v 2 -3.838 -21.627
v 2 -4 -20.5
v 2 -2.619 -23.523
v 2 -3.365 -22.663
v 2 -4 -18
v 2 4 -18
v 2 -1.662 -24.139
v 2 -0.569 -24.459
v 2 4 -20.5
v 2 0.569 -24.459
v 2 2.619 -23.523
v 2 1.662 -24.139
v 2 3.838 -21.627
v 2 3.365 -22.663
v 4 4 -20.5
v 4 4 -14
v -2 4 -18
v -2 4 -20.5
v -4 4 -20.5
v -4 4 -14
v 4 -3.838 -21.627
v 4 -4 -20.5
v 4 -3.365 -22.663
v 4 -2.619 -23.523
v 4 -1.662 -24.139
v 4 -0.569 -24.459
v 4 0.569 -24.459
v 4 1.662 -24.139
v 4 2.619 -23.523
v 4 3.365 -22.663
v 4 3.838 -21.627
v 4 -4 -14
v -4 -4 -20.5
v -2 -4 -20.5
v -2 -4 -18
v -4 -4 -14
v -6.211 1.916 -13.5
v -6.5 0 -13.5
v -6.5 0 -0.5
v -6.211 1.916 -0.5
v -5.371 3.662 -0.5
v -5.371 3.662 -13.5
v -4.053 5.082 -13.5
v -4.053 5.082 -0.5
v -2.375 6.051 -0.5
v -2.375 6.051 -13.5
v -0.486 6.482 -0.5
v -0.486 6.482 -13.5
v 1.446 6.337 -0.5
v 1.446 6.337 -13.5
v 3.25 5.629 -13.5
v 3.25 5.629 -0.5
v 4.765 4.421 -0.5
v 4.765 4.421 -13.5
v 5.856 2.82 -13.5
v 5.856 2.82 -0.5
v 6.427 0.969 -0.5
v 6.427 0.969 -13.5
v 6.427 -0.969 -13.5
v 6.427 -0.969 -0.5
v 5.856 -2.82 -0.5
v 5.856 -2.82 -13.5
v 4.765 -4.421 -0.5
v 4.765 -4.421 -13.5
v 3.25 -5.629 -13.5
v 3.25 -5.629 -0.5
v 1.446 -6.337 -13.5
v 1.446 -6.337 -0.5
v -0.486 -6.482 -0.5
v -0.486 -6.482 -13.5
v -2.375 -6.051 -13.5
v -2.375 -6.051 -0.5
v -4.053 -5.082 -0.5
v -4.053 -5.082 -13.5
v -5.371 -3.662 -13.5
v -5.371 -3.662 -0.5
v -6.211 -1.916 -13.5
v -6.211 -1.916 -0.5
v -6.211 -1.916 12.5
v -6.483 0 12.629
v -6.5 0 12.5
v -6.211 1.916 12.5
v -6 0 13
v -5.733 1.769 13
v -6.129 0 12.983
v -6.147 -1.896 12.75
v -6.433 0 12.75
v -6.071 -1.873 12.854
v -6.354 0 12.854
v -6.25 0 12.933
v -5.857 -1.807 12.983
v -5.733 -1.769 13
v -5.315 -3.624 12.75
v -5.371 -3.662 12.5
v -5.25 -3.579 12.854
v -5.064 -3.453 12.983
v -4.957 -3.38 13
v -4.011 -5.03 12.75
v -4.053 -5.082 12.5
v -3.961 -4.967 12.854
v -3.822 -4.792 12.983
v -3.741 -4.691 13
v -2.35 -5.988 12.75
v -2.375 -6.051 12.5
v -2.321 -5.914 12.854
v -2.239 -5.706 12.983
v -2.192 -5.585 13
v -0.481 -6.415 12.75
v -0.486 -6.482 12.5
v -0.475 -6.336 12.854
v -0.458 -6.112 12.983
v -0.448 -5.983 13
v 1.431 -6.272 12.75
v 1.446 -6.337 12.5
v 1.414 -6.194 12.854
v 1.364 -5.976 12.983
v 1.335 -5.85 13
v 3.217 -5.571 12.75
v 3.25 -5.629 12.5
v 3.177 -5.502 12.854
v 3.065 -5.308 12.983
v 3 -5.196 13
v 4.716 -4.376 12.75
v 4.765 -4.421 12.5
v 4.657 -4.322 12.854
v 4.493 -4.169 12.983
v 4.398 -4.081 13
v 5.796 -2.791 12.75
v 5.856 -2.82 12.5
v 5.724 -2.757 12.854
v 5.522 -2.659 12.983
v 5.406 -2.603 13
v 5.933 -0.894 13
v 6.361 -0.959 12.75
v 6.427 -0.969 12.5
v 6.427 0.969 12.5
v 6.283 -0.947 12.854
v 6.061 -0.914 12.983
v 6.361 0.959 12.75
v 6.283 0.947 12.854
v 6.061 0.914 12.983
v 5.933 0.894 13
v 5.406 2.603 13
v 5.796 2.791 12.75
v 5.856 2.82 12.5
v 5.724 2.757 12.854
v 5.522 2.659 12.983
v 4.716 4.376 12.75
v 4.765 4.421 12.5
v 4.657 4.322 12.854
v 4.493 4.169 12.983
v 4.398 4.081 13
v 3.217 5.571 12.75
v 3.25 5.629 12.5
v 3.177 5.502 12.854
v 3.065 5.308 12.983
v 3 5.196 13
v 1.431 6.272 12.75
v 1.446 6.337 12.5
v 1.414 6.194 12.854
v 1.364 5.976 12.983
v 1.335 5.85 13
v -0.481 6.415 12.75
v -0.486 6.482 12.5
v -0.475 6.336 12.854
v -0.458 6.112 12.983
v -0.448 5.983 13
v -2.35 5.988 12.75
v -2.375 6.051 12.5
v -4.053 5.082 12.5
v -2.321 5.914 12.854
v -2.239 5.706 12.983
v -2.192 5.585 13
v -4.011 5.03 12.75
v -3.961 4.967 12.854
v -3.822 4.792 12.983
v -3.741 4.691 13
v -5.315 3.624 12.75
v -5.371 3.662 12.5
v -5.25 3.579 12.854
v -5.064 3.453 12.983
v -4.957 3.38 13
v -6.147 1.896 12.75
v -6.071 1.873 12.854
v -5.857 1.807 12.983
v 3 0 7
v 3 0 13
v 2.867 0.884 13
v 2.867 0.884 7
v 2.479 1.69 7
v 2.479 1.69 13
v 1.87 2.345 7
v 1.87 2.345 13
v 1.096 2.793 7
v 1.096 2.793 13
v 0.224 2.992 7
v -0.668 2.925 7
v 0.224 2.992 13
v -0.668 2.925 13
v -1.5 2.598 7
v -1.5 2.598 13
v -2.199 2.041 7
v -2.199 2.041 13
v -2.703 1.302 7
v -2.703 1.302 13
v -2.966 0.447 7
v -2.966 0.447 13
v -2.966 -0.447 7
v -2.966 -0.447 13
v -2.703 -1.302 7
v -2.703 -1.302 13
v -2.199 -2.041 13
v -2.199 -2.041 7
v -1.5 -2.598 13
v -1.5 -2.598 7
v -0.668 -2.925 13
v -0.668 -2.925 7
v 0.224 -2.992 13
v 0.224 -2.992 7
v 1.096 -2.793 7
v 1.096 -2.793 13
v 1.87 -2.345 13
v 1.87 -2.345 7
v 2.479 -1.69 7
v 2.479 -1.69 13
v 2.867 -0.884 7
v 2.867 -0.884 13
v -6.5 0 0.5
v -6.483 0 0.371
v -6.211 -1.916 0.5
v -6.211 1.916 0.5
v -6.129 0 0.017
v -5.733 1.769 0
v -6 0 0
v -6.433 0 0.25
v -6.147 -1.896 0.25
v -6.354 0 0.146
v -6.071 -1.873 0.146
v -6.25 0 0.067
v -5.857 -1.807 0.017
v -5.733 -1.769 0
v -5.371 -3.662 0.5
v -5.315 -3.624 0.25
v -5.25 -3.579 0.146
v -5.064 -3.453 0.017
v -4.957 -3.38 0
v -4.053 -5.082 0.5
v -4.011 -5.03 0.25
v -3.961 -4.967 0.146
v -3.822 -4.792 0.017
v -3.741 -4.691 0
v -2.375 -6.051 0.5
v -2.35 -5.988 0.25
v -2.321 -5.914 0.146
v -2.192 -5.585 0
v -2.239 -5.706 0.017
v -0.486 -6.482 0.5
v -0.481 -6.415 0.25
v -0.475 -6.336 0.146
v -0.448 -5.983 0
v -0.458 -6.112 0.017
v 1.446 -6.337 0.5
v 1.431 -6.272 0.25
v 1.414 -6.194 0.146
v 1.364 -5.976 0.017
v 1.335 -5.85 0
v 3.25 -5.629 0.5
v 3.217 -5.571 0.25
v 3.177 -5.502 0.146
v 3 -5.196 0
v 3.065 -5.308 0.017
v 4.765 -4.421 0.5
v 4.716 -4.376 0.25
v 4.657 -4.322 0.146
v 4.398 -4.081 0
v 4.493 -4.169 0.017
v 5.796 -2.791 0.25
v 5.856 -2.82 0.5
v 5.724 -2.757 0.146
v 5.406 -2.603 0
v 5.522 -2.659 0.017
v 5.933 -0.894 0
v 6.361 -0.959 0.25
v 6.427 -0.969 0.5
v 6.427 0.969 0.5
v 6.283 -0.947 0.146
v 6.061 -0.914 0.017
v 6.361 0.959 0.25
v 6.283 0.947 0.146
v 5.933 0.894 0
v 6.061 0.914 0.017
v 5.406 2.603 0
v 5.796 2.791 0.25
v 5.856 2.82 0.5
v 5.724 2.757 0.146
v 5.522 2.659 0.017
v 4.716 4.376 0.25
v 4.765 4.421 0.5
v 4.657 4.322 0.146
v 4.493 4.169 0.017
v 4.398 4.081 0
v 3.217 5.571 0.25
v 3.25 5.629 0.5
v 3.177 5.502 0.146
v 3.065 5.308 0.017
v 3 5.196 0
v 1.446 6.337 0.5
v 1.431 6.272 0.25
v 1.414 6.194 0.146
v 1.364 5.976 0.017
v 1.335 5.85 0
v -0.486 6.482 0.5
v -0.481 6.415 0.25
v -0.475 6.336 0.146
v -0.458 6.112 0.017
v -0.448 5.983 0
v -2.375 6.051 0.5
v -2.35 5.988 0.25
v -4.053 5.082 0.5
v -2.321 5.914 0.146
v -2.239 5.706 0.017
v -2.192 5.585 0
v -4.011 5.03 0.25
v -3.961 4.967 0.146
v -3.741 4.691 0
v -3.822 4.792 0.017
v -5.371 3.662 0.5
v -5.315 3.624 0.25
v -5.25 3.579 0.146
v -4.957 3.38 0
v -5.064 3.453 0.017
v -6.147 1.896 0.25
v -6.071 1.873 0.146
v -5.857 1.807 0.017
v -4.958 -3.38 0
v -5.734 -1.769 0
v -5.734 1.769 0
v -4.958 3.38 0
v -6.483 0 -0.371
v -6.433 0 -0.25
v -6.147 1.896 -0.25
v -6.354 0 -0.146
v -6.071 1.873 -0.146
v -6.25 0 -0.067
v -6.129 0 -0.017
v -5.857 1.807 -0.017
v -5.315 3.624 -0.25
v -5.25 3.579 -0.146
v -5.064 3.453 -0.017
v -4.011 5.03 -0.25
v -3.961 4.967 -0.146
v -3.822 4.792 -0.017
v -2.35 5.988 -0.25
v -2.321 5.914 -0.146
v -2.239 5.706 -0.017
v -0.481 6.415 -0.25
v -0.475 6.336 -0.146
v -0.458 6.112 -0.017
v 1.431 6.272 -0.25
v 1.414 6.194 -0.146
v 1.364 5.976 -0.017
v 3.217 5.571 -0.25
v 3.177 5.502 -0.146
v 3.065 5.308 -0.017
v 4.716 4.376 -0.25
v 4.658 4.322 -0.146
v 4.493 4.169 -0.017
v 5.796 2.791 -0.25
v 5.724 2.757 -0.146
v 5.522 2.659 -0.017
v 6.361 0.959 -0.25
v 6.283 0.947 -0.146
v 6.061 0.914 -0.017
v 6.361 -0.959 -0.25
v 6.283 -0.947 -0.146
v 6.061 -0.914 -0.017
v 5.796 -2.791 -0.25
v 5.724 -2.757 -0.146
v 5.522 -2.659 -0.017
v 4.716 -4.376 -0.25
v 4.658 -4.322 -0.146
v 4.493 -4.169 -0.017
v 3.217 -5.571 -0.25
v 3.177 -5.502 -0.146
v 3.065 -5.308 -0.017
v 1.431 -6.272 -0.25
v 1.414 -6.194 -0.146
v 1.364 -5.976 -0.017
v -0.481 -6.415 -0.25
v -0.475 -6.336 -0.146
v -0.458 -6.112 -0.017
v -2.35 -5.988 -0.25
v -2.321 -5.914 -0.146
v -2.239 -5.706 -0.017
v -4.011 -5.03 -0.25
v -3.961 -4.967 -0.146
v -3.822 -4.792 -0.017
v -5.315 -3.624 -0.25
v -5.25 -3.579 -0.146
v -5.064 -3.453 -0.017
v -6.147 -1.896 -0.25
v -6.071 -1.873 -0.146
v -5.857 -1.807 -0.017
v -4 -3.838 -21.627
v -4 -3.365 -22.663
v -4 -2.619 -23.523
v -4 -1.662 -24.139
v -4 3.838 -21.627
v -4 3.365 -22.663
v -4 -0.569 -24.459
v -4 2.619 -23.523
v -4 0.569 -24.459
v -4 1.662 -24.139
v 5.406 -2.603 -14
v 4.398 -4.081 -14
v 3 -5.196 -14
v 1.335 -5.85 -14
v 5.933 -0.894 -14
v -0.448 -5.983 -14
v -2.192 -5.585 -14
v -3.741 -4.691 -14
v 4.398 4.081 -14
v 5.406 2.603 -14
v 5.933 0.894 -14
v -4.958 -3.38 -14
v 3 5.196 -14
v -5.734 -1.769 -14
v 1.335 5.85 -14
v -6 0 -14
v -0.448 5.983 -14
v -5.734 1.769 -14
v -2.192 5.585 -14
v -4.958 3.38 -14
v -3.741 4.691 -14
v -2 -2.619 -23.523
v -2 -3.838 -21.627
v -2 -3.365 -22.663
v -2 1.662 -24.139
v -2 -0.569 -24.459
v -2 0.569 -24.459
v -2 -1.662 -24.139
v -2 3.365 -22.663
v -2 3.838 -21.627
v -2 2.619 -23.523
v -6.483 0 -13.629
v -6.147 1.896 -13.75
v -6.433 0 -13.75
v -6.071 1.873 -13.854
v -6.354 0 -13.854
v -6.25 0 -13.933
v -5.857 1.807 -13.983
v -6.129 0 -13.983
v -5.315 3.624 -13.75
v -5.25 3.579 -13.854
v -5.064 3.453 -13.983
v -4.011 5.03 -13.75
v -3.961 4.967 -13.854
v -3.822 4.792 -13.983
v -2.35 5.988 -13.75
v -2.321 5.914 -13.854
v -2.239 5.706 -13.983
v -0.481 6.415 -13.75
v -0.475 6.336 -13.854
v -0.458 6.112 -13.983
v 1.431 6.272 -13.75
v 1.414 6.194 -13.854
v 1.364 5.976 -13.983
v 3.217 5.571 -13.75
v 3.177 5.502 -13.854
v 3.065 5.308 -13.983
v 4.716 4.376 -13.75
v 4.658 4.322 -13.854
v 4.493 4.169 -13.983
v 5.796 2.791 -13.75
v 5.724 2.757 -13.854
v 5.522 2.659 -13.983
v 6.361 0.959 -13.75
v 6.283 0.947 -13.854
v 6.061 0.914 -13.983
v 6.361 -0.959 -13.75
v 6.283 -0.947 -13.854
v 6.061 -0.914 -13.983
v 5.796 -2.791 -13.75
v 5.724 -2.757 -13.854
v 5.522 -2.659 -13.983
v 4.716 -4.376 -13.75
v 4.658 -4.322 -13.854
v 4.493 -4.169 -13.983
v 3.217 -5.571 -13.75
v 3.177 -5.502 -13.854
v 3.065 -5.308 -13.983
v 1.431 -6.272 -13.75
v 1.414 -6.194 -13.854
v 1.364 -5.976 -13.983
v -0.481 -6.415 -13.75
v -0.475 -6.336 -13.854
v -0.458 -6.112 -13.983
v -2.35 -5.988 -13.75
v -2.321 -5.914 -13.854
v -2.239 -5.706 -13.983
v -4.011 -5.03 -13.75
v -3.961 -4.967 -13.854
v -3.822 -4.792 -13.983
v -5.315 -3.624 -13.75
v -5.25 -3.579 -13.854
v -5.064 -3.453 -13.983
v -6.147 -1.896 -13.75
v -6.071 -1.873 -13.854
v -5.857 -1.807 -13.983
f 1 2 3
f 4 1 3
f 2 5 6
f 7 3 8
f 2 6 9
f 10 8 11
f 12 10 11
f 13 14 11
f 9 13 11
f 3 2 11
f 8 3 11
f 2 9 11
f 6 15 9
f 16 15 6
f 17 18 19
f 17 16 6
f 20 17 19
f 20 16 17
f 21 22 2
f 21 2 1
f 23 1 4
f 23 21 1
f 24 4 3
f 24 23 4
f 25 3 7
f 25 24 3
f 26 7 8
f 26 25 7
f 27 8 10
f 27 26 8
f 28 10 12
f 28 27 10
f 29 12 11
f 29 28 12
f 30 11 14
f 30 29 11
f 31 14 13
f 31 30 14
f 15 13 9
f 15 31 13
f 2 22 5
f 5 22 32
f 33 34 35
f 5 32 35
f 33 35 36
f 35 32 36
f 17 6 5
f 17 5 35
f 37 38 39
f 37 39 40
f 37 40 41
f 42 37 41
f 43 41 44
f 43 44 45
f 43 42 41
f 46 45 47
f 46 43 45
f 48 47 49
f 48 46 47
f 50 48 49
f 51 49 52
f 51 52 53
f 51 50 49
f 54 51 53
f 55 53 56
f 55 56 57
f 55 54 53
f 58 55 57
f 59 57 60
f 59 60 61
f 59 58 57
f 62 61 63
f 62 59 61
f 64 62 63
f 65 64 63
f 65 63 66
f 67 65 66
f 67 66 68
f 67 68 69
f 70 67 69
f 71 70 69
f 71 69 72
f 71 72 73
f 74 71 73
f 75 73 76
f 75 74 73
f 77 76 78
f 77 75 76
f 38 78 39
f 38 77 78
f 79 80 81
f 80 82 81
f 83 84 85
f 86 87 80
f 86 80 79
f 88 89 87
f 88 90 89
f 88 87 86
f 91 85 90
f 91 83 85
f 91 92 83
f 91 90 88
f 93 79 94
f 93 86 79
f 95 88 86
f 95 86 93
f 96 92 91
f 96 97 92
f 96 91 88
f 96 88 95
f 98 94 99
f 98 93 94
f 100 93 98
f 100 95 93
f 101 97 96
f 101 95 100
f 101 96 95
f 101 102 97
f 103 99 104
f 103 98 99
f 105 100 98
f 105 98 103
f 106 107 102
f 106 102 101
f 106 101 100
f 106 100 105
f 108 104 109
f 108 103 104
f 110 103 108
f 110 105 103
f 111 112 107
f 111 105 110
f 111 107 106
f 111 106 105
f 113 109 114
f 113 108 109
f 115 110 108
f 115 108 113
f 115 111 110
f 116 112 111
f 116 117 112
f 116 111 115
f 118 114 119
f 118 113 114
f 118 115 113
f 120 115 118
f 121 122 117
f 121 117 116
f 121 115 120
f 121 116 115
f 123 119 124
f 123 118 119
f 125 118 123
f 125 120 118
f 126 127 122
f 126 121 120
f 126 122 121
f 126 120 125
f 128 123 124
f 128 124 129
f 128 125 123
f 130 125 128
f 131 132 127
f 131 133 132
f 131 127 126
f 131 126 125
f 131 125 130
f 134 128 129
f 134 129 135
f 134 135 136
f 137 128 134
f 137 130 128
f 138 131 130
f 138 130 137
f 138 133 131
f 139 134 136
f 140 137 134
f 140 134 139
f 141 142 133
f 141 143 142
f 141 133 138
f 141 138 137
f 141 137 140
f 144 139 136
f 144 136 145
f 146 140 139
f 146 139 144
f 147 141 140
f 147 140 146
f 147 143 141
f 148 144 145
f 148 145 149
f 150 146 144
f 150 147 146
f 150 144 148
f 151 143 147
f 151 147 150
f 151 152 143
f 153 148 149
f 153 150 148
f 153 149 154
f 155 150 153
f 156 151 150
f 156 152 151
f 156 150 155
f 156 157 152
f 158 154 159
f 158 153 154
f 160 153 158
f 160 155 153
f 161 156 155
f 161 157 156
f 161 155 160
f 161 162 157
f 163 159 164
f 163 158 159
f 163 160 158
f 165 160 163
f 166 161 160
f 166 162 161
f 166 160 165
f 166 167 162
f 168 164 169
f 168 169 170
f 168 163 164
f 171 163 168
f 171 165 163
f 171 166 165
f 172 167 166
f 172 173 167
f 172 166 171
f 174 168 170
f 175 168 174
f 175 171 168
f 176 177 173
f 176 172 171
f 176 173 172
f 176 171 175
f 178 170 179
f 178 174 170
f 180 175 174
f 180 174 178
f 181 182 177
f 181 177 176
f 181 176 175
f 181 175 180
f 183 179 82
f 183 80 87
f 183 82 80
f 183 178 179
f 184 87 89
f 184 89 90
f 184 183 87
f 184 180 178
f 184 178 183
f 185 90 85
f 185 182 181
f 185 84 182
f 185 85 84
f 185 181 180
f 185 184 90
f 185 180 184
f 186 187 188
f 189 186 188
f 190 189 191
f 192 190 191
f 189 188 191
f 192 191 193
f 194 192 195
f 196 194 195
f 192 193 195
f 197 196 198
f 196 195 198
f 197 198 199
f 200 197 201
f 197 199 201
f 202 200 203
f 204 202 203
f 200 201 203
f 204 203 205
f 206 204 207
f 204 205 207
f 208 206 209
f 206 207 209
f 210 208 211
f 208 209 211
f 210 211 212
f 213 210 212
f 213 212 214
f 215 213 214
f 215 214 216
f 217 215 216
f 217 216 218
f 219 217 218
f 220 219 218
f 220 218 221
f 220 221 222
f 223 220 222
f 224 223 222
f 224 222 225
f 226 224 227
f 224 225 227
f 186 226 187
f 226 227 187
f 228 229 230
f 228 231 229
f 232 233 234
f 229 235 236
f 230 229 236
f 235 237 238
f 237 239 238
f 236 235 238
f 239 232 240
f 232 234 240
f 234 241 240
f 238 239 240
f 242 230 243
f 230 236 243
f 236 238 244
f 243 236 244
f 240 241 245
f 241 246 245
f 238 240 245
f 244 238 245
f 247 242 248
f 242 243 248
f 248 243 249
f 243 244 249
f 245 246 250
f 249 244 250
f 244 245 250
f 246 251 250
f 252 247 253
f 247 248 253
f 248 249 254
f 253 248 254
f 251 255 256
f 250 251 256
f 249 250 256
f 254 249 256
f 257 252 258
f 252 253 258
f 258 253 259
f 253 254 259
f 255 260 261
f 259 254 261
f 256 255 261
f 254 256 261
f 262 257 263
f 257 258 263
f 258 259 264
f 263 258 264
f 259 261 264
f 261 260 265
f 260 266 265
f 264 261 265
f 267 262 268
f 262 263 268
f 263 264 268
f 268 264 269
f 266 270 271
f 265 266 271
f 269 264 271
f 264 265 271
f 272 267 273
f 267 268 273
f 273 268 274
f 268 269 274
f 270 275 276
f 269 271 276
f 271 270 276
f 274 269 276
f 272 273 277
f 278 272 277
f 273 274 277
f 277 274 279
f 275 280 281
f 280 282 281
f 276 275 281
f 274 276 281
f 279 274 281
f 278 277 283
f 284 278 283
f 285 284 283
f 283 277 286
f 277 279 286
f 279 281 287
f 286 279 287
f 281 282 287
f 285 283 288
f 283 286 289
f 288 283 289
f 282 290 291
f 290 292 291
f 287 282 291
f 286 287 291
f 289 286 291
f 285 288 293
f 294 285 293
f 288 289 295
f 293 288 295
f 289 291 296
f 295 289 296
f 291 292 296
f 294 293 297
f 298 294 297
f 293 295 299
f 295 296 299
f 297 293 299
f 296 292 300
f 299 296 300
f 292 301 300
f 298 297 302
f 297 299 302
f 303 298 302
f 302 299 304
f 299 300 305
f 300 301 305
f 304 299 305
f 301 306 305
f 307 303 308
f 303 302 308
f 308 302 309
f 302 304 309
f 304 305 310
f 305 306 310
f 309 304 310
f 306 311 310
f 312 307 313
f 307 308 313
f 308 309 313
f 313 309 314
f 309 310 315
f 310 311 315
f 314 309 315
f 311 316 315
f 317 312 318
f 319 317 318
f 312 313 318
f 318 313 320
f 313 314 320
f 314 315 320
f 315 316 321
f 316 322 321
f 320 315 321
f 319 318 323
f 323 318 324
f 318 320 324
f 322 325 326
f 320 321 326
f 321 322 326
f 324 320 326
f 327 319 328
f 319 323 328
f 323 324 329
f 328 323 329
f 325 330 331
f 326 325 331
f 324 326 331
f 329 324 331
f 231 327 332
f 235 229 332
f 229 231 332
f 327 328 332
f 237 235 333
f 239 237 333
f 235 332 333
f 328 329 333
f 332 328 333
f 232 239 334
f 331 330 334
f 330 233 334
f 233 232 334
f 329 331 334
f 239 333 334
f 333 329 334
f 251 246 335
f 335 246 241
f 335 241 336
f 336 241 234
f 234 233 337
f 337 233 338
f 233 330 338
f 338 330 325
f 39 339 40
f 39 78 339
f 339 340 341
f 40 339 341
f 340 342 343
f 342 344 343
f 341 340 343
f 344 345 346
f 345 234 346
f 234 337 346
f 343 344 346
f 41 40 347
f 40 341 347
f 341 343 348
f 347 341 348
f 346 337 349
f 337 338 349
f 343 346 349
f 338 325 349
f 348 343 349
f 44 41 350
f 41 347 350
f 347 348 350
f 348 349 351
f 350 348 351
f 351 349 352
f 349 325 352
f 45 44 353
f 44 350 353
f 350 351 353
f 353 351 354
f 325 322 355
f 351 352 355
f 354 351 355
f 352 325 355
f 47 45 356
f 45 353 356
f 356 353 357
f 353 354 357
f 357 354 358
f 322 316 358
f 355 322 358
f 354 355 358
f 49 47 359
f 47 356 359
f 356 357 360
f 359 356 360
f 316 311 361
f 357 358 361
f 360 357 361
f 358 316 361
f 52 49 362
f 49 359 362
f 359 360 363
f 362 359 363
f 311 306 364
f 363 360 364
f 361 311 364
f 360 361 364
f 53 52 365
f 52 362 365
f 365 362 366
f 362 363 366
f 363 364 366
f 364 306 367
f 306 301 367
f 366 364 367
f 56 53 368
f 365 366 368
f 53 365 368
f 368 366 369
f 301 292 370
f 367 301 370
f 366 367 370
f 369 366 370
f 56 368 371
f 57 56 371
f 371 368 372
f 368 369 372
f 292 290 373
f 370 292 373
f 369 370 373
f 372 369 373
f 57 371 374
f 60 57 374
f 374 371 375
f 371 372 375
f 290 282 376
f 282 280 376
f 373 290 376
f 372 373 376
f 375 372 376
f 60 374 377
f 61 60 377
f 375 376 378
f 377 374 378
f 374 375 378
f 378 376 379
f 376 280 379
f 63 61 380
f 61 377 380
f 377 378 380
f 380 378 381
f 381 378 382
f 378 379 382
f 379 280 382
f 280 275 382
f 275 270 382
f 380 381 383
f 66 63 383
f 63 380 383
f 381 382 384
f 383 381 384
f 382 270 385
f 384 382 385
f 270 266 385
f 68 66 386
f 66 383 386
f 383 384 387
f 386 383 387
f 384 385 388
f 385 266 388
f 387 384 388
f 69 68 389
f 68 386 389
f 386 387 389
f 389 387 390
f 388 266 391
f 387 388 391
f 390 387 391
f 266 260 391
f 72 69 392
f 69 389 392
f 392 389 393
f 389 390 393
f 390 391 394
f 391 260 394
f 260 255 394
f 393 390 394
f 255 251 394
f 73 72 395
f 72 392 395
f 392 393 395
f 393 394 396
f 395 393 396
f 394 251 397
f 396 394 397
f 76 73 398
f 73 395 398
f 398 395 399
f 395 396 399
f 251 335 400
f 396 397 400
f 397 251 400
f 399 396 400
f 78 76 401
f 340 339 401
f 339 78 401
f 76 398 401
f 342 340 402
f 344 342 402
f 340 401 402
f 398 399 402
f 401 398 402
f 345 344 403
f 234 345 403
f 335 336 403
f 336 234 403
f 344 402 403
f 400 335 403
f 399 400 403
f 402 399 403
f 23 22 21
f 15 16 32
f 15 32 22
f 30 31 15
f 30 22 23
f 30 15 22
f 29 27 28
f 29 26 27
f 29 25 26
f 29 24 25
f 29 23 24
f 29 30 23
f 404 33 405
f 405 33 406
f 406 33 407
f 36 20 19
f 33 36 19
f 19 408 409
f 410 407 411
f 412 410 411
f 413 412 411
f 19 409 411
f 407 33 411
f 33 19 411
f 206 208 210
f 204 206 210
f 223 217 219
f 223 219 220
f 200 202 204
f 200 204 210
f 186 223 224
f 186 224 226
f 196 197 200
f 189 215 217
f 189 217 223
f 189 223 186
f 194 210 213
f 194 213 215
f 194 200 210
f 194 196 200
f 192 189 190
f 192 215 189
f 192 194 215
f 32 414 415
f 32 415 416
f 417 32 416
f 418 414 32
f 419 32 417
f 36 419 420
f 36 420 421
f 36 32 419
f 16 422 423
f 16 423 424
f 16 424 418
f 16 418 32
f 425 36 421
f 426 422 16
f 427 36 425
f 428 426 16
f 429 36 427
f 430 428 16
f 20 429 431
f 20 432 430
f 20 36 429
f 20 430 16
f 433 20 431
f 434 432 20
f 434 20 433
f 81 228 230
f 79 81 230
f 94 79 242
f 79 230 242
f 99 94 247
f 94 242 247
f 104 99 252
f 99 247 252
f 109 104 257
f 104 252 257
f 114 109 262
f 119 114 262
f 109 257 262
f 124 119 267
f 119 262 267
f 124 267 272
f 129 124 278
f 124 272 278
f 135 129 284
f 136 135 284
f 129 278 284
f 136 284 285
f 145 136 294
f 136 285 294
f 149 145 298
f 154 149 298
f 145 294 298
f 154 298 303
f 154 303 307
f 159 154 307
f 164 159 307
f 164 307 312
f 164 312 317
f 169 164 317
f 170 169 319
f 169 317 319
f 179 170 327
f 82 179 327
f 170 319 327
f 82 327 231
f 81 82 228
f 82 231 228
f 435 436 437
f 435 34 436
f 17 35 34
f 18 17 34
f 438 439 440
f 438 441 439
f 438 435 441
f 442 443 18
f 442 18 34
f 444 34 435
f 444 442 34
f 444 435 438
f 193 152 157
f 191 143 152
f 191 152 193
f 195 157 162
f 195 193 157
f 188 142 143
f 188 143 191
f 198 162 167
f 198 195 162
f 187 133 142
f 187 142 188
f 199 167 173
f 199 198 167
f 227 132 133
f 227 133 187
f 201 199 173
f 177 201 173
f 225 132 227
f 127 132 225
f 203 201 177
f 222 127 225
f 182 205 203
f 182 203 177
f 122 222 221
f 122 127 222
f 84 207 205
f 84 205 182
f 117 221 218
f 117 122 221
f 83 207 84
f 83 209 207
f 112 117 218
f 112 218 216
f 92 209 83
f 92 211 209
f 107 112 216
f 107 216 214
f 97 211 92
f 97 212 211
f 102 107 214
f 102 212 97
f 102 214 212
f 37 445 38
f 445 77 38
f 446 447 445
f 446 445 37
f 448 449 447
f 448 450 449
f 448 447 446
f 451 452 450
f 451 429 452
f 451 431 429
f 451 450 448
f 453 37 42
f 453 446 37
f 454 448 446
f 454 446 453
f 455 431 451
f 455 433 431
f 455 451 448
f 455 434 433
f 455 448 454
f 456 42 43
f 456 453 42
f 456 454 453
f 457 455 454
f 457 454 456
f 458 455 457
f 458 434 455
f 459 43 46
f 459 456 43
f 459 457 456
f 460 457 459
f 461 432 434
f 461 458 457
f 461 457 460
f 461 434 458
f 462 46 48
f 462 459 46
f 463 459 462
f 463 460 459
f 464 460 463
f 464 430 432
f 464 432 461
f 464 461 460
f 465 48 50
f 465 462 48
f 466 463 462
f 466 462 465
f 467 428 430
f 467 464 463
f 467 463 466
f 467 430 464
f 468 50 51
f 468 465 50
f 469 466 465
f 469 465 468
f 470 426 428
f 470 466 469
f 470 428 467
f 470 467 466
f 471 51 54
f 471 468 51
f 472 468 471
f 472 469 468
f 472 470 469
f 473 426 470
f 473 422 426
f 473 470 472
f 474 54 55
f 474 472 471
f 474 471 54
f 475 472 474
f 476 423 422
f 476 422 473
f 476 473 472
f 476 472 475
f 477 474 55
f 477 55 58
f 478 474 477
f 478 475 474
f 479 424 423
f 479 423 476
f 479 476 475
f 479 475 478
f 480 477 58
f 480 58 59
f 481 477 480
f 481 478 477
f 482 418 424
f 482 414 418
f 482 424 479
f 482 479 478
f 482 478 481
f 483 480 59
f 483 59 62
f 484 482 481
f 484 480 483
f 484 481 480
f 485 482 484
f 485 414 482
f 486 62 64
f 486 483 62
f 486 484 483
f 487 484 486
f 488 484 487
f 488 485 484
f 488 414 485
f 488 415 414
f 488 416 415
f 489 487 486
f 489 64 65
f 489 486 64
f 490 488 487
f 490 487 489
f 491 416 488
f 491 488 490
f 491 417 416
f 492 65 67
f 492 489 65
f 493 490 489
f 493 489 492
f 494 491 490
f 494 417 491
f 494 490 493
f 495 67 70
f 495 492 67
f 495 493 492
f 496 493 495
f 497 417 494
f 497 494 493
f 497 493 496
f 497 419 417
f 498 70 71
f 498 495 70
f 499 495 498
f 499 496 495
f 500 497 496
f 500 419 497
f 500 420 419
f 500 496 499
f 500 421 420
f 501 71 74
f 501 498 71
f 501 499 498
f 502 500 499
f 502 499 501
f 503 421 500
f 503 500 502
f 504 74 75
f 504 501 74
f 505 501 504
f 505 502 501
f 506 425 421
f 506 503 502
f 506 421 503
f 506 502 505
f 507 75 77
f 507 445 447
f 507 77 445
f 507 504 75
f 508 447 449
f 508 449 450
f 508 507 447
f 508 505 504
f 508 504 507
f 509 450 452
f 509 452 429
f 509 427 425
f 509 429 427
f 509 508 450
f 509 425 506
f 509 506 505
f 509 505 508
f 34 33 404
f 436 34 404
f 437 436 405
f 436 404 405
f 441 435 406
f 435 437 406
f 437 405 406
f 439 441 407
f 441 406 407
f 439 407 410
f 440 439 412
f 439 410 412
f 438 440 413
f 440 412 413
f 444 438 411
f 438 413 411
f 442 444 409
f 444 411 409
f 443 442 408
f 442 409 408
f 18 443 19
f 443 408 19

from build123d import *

# Parameters (mm, degrees)
SKETCH1_R           = 6.5
BOSS_EXTRUDE1_DEPTH = 13
FILLET1_R           = 0.5
SKETCH2_R           = 3
CUT_EXTRUDE1_DEPTH  = 6
BOSS_EXTRUDE2_START = 14
SKETCH3_R           = 6.5
BOSS_EXTRUDE2_DEPTH = 14
FILLET2_R           = 0.5
SKETCH4_W           = 8
SKETCH4_H           = 8
BOSS_EXTRUDE3_DEPTH = 4
SKETCH5_W           = 2
SKETCH5_H           = 8
BOSS_EXTRUDE4_DEPTH = 2.5
SKETCH6_R           = 4
BOSS_EXTRUDE5_DEPTH = 2


with BuildPart() as part:
    # Sketch1 → Boss-Extrude1 (new body)
    with BuildSketch(Plane.XY):
        with Locations(Location((0, 0, 0), (0, 0, 180))):
            Circle(SKETCH1_R)
    extrude(amount=BOSS_EXTRUDE1_DEPTH)

    # Fillet1
    fillet1_edges = [part.edges().sort_by_distance(p)[0] for p in [
        (6.5, 0, 0),
        (6.5, 0, 13),
    ]]
    fillet(fillet1_edges, radius=FILLET1_R)

    # Sketch2 → Cut-Extrude1 (cut)
    with BuildSketch(Plane.XY.offset(13)):
        Circle(SKETCH2_R)
    extrude(amount=-CUT_EXTRUDE1_DEPTH, mode=Mode.SUBTRACT)

    # Sketch3 → Boss-Extrude2 (add)
    with BuildSketch(Plane(origin=(0, 0, 0), x_dir=(-1, 0, 0), z_dir=(0, 0, -1)).offset(BOSS_EXTRUDE2_START)):
        Circle(SKETCH3_R)
    extrude(amount=-BOSS_EXTRUDE2_DEPTH)

    # Fillet2
    fillet2_edges = [part.edges().sort_by_distance(p)[0] for p in [
        (6.5, 0, 0),
        (6.5, 0, -14),
    ]]
    fillet(fillet2_edges, radius=FILLET2_R - 0.0001)  # a hair under: the kernel refuses the full size

    # Sketch4 → Boss-Extrude3 (add)
    with BuildSketch(Plane(origin=(0, 0, -14), x_dir=(-1, 0, 0), z_dir=(0, 0, -1))):
        Rectangle(SKETCH4_W, SKETCH4_H)
    extrude(amount=BOSS_EXTRUDE3_DEPTH)

    # Sketch5 → Boss-Extrude4 (add)
    with BuildSketch(Plane(origin=(0, 0, -18), x_dir=(-1, 0, 0), z_dir=(0, 0, -1))):
        with Locations((-3, 0)):
            Rectangle(SKETCH5_W, SKETCH5_H)
        with Locations((3, 0)):
            Rectangle(SKETCH5_W, SKETCH5_H)
    extrude(amount=BOSS_EXTRUDE4_DEPTH)

    # Sketch6 → Boss-Extrude5 (add)
    with BuildSketch(Plane(origin=(4, 0, 0), x_dir=(0, 0, -1), z_dir=(1, 0, 0))):
        with Locations((20.5, 0)):
            Circle(SKETCH6_R)
    boss_extrude5 = extrude(amount=-BOSS_EXTRUDE5_DEPTH)

    # Mirror1: Boss-Extrude5 across plane
    add(boss_extrude5.mirror(Plane(origin=(0, 0, 0), x_dir=(0, 0, 1), z_dir=(1, 0, 0))))


solid = part.part
